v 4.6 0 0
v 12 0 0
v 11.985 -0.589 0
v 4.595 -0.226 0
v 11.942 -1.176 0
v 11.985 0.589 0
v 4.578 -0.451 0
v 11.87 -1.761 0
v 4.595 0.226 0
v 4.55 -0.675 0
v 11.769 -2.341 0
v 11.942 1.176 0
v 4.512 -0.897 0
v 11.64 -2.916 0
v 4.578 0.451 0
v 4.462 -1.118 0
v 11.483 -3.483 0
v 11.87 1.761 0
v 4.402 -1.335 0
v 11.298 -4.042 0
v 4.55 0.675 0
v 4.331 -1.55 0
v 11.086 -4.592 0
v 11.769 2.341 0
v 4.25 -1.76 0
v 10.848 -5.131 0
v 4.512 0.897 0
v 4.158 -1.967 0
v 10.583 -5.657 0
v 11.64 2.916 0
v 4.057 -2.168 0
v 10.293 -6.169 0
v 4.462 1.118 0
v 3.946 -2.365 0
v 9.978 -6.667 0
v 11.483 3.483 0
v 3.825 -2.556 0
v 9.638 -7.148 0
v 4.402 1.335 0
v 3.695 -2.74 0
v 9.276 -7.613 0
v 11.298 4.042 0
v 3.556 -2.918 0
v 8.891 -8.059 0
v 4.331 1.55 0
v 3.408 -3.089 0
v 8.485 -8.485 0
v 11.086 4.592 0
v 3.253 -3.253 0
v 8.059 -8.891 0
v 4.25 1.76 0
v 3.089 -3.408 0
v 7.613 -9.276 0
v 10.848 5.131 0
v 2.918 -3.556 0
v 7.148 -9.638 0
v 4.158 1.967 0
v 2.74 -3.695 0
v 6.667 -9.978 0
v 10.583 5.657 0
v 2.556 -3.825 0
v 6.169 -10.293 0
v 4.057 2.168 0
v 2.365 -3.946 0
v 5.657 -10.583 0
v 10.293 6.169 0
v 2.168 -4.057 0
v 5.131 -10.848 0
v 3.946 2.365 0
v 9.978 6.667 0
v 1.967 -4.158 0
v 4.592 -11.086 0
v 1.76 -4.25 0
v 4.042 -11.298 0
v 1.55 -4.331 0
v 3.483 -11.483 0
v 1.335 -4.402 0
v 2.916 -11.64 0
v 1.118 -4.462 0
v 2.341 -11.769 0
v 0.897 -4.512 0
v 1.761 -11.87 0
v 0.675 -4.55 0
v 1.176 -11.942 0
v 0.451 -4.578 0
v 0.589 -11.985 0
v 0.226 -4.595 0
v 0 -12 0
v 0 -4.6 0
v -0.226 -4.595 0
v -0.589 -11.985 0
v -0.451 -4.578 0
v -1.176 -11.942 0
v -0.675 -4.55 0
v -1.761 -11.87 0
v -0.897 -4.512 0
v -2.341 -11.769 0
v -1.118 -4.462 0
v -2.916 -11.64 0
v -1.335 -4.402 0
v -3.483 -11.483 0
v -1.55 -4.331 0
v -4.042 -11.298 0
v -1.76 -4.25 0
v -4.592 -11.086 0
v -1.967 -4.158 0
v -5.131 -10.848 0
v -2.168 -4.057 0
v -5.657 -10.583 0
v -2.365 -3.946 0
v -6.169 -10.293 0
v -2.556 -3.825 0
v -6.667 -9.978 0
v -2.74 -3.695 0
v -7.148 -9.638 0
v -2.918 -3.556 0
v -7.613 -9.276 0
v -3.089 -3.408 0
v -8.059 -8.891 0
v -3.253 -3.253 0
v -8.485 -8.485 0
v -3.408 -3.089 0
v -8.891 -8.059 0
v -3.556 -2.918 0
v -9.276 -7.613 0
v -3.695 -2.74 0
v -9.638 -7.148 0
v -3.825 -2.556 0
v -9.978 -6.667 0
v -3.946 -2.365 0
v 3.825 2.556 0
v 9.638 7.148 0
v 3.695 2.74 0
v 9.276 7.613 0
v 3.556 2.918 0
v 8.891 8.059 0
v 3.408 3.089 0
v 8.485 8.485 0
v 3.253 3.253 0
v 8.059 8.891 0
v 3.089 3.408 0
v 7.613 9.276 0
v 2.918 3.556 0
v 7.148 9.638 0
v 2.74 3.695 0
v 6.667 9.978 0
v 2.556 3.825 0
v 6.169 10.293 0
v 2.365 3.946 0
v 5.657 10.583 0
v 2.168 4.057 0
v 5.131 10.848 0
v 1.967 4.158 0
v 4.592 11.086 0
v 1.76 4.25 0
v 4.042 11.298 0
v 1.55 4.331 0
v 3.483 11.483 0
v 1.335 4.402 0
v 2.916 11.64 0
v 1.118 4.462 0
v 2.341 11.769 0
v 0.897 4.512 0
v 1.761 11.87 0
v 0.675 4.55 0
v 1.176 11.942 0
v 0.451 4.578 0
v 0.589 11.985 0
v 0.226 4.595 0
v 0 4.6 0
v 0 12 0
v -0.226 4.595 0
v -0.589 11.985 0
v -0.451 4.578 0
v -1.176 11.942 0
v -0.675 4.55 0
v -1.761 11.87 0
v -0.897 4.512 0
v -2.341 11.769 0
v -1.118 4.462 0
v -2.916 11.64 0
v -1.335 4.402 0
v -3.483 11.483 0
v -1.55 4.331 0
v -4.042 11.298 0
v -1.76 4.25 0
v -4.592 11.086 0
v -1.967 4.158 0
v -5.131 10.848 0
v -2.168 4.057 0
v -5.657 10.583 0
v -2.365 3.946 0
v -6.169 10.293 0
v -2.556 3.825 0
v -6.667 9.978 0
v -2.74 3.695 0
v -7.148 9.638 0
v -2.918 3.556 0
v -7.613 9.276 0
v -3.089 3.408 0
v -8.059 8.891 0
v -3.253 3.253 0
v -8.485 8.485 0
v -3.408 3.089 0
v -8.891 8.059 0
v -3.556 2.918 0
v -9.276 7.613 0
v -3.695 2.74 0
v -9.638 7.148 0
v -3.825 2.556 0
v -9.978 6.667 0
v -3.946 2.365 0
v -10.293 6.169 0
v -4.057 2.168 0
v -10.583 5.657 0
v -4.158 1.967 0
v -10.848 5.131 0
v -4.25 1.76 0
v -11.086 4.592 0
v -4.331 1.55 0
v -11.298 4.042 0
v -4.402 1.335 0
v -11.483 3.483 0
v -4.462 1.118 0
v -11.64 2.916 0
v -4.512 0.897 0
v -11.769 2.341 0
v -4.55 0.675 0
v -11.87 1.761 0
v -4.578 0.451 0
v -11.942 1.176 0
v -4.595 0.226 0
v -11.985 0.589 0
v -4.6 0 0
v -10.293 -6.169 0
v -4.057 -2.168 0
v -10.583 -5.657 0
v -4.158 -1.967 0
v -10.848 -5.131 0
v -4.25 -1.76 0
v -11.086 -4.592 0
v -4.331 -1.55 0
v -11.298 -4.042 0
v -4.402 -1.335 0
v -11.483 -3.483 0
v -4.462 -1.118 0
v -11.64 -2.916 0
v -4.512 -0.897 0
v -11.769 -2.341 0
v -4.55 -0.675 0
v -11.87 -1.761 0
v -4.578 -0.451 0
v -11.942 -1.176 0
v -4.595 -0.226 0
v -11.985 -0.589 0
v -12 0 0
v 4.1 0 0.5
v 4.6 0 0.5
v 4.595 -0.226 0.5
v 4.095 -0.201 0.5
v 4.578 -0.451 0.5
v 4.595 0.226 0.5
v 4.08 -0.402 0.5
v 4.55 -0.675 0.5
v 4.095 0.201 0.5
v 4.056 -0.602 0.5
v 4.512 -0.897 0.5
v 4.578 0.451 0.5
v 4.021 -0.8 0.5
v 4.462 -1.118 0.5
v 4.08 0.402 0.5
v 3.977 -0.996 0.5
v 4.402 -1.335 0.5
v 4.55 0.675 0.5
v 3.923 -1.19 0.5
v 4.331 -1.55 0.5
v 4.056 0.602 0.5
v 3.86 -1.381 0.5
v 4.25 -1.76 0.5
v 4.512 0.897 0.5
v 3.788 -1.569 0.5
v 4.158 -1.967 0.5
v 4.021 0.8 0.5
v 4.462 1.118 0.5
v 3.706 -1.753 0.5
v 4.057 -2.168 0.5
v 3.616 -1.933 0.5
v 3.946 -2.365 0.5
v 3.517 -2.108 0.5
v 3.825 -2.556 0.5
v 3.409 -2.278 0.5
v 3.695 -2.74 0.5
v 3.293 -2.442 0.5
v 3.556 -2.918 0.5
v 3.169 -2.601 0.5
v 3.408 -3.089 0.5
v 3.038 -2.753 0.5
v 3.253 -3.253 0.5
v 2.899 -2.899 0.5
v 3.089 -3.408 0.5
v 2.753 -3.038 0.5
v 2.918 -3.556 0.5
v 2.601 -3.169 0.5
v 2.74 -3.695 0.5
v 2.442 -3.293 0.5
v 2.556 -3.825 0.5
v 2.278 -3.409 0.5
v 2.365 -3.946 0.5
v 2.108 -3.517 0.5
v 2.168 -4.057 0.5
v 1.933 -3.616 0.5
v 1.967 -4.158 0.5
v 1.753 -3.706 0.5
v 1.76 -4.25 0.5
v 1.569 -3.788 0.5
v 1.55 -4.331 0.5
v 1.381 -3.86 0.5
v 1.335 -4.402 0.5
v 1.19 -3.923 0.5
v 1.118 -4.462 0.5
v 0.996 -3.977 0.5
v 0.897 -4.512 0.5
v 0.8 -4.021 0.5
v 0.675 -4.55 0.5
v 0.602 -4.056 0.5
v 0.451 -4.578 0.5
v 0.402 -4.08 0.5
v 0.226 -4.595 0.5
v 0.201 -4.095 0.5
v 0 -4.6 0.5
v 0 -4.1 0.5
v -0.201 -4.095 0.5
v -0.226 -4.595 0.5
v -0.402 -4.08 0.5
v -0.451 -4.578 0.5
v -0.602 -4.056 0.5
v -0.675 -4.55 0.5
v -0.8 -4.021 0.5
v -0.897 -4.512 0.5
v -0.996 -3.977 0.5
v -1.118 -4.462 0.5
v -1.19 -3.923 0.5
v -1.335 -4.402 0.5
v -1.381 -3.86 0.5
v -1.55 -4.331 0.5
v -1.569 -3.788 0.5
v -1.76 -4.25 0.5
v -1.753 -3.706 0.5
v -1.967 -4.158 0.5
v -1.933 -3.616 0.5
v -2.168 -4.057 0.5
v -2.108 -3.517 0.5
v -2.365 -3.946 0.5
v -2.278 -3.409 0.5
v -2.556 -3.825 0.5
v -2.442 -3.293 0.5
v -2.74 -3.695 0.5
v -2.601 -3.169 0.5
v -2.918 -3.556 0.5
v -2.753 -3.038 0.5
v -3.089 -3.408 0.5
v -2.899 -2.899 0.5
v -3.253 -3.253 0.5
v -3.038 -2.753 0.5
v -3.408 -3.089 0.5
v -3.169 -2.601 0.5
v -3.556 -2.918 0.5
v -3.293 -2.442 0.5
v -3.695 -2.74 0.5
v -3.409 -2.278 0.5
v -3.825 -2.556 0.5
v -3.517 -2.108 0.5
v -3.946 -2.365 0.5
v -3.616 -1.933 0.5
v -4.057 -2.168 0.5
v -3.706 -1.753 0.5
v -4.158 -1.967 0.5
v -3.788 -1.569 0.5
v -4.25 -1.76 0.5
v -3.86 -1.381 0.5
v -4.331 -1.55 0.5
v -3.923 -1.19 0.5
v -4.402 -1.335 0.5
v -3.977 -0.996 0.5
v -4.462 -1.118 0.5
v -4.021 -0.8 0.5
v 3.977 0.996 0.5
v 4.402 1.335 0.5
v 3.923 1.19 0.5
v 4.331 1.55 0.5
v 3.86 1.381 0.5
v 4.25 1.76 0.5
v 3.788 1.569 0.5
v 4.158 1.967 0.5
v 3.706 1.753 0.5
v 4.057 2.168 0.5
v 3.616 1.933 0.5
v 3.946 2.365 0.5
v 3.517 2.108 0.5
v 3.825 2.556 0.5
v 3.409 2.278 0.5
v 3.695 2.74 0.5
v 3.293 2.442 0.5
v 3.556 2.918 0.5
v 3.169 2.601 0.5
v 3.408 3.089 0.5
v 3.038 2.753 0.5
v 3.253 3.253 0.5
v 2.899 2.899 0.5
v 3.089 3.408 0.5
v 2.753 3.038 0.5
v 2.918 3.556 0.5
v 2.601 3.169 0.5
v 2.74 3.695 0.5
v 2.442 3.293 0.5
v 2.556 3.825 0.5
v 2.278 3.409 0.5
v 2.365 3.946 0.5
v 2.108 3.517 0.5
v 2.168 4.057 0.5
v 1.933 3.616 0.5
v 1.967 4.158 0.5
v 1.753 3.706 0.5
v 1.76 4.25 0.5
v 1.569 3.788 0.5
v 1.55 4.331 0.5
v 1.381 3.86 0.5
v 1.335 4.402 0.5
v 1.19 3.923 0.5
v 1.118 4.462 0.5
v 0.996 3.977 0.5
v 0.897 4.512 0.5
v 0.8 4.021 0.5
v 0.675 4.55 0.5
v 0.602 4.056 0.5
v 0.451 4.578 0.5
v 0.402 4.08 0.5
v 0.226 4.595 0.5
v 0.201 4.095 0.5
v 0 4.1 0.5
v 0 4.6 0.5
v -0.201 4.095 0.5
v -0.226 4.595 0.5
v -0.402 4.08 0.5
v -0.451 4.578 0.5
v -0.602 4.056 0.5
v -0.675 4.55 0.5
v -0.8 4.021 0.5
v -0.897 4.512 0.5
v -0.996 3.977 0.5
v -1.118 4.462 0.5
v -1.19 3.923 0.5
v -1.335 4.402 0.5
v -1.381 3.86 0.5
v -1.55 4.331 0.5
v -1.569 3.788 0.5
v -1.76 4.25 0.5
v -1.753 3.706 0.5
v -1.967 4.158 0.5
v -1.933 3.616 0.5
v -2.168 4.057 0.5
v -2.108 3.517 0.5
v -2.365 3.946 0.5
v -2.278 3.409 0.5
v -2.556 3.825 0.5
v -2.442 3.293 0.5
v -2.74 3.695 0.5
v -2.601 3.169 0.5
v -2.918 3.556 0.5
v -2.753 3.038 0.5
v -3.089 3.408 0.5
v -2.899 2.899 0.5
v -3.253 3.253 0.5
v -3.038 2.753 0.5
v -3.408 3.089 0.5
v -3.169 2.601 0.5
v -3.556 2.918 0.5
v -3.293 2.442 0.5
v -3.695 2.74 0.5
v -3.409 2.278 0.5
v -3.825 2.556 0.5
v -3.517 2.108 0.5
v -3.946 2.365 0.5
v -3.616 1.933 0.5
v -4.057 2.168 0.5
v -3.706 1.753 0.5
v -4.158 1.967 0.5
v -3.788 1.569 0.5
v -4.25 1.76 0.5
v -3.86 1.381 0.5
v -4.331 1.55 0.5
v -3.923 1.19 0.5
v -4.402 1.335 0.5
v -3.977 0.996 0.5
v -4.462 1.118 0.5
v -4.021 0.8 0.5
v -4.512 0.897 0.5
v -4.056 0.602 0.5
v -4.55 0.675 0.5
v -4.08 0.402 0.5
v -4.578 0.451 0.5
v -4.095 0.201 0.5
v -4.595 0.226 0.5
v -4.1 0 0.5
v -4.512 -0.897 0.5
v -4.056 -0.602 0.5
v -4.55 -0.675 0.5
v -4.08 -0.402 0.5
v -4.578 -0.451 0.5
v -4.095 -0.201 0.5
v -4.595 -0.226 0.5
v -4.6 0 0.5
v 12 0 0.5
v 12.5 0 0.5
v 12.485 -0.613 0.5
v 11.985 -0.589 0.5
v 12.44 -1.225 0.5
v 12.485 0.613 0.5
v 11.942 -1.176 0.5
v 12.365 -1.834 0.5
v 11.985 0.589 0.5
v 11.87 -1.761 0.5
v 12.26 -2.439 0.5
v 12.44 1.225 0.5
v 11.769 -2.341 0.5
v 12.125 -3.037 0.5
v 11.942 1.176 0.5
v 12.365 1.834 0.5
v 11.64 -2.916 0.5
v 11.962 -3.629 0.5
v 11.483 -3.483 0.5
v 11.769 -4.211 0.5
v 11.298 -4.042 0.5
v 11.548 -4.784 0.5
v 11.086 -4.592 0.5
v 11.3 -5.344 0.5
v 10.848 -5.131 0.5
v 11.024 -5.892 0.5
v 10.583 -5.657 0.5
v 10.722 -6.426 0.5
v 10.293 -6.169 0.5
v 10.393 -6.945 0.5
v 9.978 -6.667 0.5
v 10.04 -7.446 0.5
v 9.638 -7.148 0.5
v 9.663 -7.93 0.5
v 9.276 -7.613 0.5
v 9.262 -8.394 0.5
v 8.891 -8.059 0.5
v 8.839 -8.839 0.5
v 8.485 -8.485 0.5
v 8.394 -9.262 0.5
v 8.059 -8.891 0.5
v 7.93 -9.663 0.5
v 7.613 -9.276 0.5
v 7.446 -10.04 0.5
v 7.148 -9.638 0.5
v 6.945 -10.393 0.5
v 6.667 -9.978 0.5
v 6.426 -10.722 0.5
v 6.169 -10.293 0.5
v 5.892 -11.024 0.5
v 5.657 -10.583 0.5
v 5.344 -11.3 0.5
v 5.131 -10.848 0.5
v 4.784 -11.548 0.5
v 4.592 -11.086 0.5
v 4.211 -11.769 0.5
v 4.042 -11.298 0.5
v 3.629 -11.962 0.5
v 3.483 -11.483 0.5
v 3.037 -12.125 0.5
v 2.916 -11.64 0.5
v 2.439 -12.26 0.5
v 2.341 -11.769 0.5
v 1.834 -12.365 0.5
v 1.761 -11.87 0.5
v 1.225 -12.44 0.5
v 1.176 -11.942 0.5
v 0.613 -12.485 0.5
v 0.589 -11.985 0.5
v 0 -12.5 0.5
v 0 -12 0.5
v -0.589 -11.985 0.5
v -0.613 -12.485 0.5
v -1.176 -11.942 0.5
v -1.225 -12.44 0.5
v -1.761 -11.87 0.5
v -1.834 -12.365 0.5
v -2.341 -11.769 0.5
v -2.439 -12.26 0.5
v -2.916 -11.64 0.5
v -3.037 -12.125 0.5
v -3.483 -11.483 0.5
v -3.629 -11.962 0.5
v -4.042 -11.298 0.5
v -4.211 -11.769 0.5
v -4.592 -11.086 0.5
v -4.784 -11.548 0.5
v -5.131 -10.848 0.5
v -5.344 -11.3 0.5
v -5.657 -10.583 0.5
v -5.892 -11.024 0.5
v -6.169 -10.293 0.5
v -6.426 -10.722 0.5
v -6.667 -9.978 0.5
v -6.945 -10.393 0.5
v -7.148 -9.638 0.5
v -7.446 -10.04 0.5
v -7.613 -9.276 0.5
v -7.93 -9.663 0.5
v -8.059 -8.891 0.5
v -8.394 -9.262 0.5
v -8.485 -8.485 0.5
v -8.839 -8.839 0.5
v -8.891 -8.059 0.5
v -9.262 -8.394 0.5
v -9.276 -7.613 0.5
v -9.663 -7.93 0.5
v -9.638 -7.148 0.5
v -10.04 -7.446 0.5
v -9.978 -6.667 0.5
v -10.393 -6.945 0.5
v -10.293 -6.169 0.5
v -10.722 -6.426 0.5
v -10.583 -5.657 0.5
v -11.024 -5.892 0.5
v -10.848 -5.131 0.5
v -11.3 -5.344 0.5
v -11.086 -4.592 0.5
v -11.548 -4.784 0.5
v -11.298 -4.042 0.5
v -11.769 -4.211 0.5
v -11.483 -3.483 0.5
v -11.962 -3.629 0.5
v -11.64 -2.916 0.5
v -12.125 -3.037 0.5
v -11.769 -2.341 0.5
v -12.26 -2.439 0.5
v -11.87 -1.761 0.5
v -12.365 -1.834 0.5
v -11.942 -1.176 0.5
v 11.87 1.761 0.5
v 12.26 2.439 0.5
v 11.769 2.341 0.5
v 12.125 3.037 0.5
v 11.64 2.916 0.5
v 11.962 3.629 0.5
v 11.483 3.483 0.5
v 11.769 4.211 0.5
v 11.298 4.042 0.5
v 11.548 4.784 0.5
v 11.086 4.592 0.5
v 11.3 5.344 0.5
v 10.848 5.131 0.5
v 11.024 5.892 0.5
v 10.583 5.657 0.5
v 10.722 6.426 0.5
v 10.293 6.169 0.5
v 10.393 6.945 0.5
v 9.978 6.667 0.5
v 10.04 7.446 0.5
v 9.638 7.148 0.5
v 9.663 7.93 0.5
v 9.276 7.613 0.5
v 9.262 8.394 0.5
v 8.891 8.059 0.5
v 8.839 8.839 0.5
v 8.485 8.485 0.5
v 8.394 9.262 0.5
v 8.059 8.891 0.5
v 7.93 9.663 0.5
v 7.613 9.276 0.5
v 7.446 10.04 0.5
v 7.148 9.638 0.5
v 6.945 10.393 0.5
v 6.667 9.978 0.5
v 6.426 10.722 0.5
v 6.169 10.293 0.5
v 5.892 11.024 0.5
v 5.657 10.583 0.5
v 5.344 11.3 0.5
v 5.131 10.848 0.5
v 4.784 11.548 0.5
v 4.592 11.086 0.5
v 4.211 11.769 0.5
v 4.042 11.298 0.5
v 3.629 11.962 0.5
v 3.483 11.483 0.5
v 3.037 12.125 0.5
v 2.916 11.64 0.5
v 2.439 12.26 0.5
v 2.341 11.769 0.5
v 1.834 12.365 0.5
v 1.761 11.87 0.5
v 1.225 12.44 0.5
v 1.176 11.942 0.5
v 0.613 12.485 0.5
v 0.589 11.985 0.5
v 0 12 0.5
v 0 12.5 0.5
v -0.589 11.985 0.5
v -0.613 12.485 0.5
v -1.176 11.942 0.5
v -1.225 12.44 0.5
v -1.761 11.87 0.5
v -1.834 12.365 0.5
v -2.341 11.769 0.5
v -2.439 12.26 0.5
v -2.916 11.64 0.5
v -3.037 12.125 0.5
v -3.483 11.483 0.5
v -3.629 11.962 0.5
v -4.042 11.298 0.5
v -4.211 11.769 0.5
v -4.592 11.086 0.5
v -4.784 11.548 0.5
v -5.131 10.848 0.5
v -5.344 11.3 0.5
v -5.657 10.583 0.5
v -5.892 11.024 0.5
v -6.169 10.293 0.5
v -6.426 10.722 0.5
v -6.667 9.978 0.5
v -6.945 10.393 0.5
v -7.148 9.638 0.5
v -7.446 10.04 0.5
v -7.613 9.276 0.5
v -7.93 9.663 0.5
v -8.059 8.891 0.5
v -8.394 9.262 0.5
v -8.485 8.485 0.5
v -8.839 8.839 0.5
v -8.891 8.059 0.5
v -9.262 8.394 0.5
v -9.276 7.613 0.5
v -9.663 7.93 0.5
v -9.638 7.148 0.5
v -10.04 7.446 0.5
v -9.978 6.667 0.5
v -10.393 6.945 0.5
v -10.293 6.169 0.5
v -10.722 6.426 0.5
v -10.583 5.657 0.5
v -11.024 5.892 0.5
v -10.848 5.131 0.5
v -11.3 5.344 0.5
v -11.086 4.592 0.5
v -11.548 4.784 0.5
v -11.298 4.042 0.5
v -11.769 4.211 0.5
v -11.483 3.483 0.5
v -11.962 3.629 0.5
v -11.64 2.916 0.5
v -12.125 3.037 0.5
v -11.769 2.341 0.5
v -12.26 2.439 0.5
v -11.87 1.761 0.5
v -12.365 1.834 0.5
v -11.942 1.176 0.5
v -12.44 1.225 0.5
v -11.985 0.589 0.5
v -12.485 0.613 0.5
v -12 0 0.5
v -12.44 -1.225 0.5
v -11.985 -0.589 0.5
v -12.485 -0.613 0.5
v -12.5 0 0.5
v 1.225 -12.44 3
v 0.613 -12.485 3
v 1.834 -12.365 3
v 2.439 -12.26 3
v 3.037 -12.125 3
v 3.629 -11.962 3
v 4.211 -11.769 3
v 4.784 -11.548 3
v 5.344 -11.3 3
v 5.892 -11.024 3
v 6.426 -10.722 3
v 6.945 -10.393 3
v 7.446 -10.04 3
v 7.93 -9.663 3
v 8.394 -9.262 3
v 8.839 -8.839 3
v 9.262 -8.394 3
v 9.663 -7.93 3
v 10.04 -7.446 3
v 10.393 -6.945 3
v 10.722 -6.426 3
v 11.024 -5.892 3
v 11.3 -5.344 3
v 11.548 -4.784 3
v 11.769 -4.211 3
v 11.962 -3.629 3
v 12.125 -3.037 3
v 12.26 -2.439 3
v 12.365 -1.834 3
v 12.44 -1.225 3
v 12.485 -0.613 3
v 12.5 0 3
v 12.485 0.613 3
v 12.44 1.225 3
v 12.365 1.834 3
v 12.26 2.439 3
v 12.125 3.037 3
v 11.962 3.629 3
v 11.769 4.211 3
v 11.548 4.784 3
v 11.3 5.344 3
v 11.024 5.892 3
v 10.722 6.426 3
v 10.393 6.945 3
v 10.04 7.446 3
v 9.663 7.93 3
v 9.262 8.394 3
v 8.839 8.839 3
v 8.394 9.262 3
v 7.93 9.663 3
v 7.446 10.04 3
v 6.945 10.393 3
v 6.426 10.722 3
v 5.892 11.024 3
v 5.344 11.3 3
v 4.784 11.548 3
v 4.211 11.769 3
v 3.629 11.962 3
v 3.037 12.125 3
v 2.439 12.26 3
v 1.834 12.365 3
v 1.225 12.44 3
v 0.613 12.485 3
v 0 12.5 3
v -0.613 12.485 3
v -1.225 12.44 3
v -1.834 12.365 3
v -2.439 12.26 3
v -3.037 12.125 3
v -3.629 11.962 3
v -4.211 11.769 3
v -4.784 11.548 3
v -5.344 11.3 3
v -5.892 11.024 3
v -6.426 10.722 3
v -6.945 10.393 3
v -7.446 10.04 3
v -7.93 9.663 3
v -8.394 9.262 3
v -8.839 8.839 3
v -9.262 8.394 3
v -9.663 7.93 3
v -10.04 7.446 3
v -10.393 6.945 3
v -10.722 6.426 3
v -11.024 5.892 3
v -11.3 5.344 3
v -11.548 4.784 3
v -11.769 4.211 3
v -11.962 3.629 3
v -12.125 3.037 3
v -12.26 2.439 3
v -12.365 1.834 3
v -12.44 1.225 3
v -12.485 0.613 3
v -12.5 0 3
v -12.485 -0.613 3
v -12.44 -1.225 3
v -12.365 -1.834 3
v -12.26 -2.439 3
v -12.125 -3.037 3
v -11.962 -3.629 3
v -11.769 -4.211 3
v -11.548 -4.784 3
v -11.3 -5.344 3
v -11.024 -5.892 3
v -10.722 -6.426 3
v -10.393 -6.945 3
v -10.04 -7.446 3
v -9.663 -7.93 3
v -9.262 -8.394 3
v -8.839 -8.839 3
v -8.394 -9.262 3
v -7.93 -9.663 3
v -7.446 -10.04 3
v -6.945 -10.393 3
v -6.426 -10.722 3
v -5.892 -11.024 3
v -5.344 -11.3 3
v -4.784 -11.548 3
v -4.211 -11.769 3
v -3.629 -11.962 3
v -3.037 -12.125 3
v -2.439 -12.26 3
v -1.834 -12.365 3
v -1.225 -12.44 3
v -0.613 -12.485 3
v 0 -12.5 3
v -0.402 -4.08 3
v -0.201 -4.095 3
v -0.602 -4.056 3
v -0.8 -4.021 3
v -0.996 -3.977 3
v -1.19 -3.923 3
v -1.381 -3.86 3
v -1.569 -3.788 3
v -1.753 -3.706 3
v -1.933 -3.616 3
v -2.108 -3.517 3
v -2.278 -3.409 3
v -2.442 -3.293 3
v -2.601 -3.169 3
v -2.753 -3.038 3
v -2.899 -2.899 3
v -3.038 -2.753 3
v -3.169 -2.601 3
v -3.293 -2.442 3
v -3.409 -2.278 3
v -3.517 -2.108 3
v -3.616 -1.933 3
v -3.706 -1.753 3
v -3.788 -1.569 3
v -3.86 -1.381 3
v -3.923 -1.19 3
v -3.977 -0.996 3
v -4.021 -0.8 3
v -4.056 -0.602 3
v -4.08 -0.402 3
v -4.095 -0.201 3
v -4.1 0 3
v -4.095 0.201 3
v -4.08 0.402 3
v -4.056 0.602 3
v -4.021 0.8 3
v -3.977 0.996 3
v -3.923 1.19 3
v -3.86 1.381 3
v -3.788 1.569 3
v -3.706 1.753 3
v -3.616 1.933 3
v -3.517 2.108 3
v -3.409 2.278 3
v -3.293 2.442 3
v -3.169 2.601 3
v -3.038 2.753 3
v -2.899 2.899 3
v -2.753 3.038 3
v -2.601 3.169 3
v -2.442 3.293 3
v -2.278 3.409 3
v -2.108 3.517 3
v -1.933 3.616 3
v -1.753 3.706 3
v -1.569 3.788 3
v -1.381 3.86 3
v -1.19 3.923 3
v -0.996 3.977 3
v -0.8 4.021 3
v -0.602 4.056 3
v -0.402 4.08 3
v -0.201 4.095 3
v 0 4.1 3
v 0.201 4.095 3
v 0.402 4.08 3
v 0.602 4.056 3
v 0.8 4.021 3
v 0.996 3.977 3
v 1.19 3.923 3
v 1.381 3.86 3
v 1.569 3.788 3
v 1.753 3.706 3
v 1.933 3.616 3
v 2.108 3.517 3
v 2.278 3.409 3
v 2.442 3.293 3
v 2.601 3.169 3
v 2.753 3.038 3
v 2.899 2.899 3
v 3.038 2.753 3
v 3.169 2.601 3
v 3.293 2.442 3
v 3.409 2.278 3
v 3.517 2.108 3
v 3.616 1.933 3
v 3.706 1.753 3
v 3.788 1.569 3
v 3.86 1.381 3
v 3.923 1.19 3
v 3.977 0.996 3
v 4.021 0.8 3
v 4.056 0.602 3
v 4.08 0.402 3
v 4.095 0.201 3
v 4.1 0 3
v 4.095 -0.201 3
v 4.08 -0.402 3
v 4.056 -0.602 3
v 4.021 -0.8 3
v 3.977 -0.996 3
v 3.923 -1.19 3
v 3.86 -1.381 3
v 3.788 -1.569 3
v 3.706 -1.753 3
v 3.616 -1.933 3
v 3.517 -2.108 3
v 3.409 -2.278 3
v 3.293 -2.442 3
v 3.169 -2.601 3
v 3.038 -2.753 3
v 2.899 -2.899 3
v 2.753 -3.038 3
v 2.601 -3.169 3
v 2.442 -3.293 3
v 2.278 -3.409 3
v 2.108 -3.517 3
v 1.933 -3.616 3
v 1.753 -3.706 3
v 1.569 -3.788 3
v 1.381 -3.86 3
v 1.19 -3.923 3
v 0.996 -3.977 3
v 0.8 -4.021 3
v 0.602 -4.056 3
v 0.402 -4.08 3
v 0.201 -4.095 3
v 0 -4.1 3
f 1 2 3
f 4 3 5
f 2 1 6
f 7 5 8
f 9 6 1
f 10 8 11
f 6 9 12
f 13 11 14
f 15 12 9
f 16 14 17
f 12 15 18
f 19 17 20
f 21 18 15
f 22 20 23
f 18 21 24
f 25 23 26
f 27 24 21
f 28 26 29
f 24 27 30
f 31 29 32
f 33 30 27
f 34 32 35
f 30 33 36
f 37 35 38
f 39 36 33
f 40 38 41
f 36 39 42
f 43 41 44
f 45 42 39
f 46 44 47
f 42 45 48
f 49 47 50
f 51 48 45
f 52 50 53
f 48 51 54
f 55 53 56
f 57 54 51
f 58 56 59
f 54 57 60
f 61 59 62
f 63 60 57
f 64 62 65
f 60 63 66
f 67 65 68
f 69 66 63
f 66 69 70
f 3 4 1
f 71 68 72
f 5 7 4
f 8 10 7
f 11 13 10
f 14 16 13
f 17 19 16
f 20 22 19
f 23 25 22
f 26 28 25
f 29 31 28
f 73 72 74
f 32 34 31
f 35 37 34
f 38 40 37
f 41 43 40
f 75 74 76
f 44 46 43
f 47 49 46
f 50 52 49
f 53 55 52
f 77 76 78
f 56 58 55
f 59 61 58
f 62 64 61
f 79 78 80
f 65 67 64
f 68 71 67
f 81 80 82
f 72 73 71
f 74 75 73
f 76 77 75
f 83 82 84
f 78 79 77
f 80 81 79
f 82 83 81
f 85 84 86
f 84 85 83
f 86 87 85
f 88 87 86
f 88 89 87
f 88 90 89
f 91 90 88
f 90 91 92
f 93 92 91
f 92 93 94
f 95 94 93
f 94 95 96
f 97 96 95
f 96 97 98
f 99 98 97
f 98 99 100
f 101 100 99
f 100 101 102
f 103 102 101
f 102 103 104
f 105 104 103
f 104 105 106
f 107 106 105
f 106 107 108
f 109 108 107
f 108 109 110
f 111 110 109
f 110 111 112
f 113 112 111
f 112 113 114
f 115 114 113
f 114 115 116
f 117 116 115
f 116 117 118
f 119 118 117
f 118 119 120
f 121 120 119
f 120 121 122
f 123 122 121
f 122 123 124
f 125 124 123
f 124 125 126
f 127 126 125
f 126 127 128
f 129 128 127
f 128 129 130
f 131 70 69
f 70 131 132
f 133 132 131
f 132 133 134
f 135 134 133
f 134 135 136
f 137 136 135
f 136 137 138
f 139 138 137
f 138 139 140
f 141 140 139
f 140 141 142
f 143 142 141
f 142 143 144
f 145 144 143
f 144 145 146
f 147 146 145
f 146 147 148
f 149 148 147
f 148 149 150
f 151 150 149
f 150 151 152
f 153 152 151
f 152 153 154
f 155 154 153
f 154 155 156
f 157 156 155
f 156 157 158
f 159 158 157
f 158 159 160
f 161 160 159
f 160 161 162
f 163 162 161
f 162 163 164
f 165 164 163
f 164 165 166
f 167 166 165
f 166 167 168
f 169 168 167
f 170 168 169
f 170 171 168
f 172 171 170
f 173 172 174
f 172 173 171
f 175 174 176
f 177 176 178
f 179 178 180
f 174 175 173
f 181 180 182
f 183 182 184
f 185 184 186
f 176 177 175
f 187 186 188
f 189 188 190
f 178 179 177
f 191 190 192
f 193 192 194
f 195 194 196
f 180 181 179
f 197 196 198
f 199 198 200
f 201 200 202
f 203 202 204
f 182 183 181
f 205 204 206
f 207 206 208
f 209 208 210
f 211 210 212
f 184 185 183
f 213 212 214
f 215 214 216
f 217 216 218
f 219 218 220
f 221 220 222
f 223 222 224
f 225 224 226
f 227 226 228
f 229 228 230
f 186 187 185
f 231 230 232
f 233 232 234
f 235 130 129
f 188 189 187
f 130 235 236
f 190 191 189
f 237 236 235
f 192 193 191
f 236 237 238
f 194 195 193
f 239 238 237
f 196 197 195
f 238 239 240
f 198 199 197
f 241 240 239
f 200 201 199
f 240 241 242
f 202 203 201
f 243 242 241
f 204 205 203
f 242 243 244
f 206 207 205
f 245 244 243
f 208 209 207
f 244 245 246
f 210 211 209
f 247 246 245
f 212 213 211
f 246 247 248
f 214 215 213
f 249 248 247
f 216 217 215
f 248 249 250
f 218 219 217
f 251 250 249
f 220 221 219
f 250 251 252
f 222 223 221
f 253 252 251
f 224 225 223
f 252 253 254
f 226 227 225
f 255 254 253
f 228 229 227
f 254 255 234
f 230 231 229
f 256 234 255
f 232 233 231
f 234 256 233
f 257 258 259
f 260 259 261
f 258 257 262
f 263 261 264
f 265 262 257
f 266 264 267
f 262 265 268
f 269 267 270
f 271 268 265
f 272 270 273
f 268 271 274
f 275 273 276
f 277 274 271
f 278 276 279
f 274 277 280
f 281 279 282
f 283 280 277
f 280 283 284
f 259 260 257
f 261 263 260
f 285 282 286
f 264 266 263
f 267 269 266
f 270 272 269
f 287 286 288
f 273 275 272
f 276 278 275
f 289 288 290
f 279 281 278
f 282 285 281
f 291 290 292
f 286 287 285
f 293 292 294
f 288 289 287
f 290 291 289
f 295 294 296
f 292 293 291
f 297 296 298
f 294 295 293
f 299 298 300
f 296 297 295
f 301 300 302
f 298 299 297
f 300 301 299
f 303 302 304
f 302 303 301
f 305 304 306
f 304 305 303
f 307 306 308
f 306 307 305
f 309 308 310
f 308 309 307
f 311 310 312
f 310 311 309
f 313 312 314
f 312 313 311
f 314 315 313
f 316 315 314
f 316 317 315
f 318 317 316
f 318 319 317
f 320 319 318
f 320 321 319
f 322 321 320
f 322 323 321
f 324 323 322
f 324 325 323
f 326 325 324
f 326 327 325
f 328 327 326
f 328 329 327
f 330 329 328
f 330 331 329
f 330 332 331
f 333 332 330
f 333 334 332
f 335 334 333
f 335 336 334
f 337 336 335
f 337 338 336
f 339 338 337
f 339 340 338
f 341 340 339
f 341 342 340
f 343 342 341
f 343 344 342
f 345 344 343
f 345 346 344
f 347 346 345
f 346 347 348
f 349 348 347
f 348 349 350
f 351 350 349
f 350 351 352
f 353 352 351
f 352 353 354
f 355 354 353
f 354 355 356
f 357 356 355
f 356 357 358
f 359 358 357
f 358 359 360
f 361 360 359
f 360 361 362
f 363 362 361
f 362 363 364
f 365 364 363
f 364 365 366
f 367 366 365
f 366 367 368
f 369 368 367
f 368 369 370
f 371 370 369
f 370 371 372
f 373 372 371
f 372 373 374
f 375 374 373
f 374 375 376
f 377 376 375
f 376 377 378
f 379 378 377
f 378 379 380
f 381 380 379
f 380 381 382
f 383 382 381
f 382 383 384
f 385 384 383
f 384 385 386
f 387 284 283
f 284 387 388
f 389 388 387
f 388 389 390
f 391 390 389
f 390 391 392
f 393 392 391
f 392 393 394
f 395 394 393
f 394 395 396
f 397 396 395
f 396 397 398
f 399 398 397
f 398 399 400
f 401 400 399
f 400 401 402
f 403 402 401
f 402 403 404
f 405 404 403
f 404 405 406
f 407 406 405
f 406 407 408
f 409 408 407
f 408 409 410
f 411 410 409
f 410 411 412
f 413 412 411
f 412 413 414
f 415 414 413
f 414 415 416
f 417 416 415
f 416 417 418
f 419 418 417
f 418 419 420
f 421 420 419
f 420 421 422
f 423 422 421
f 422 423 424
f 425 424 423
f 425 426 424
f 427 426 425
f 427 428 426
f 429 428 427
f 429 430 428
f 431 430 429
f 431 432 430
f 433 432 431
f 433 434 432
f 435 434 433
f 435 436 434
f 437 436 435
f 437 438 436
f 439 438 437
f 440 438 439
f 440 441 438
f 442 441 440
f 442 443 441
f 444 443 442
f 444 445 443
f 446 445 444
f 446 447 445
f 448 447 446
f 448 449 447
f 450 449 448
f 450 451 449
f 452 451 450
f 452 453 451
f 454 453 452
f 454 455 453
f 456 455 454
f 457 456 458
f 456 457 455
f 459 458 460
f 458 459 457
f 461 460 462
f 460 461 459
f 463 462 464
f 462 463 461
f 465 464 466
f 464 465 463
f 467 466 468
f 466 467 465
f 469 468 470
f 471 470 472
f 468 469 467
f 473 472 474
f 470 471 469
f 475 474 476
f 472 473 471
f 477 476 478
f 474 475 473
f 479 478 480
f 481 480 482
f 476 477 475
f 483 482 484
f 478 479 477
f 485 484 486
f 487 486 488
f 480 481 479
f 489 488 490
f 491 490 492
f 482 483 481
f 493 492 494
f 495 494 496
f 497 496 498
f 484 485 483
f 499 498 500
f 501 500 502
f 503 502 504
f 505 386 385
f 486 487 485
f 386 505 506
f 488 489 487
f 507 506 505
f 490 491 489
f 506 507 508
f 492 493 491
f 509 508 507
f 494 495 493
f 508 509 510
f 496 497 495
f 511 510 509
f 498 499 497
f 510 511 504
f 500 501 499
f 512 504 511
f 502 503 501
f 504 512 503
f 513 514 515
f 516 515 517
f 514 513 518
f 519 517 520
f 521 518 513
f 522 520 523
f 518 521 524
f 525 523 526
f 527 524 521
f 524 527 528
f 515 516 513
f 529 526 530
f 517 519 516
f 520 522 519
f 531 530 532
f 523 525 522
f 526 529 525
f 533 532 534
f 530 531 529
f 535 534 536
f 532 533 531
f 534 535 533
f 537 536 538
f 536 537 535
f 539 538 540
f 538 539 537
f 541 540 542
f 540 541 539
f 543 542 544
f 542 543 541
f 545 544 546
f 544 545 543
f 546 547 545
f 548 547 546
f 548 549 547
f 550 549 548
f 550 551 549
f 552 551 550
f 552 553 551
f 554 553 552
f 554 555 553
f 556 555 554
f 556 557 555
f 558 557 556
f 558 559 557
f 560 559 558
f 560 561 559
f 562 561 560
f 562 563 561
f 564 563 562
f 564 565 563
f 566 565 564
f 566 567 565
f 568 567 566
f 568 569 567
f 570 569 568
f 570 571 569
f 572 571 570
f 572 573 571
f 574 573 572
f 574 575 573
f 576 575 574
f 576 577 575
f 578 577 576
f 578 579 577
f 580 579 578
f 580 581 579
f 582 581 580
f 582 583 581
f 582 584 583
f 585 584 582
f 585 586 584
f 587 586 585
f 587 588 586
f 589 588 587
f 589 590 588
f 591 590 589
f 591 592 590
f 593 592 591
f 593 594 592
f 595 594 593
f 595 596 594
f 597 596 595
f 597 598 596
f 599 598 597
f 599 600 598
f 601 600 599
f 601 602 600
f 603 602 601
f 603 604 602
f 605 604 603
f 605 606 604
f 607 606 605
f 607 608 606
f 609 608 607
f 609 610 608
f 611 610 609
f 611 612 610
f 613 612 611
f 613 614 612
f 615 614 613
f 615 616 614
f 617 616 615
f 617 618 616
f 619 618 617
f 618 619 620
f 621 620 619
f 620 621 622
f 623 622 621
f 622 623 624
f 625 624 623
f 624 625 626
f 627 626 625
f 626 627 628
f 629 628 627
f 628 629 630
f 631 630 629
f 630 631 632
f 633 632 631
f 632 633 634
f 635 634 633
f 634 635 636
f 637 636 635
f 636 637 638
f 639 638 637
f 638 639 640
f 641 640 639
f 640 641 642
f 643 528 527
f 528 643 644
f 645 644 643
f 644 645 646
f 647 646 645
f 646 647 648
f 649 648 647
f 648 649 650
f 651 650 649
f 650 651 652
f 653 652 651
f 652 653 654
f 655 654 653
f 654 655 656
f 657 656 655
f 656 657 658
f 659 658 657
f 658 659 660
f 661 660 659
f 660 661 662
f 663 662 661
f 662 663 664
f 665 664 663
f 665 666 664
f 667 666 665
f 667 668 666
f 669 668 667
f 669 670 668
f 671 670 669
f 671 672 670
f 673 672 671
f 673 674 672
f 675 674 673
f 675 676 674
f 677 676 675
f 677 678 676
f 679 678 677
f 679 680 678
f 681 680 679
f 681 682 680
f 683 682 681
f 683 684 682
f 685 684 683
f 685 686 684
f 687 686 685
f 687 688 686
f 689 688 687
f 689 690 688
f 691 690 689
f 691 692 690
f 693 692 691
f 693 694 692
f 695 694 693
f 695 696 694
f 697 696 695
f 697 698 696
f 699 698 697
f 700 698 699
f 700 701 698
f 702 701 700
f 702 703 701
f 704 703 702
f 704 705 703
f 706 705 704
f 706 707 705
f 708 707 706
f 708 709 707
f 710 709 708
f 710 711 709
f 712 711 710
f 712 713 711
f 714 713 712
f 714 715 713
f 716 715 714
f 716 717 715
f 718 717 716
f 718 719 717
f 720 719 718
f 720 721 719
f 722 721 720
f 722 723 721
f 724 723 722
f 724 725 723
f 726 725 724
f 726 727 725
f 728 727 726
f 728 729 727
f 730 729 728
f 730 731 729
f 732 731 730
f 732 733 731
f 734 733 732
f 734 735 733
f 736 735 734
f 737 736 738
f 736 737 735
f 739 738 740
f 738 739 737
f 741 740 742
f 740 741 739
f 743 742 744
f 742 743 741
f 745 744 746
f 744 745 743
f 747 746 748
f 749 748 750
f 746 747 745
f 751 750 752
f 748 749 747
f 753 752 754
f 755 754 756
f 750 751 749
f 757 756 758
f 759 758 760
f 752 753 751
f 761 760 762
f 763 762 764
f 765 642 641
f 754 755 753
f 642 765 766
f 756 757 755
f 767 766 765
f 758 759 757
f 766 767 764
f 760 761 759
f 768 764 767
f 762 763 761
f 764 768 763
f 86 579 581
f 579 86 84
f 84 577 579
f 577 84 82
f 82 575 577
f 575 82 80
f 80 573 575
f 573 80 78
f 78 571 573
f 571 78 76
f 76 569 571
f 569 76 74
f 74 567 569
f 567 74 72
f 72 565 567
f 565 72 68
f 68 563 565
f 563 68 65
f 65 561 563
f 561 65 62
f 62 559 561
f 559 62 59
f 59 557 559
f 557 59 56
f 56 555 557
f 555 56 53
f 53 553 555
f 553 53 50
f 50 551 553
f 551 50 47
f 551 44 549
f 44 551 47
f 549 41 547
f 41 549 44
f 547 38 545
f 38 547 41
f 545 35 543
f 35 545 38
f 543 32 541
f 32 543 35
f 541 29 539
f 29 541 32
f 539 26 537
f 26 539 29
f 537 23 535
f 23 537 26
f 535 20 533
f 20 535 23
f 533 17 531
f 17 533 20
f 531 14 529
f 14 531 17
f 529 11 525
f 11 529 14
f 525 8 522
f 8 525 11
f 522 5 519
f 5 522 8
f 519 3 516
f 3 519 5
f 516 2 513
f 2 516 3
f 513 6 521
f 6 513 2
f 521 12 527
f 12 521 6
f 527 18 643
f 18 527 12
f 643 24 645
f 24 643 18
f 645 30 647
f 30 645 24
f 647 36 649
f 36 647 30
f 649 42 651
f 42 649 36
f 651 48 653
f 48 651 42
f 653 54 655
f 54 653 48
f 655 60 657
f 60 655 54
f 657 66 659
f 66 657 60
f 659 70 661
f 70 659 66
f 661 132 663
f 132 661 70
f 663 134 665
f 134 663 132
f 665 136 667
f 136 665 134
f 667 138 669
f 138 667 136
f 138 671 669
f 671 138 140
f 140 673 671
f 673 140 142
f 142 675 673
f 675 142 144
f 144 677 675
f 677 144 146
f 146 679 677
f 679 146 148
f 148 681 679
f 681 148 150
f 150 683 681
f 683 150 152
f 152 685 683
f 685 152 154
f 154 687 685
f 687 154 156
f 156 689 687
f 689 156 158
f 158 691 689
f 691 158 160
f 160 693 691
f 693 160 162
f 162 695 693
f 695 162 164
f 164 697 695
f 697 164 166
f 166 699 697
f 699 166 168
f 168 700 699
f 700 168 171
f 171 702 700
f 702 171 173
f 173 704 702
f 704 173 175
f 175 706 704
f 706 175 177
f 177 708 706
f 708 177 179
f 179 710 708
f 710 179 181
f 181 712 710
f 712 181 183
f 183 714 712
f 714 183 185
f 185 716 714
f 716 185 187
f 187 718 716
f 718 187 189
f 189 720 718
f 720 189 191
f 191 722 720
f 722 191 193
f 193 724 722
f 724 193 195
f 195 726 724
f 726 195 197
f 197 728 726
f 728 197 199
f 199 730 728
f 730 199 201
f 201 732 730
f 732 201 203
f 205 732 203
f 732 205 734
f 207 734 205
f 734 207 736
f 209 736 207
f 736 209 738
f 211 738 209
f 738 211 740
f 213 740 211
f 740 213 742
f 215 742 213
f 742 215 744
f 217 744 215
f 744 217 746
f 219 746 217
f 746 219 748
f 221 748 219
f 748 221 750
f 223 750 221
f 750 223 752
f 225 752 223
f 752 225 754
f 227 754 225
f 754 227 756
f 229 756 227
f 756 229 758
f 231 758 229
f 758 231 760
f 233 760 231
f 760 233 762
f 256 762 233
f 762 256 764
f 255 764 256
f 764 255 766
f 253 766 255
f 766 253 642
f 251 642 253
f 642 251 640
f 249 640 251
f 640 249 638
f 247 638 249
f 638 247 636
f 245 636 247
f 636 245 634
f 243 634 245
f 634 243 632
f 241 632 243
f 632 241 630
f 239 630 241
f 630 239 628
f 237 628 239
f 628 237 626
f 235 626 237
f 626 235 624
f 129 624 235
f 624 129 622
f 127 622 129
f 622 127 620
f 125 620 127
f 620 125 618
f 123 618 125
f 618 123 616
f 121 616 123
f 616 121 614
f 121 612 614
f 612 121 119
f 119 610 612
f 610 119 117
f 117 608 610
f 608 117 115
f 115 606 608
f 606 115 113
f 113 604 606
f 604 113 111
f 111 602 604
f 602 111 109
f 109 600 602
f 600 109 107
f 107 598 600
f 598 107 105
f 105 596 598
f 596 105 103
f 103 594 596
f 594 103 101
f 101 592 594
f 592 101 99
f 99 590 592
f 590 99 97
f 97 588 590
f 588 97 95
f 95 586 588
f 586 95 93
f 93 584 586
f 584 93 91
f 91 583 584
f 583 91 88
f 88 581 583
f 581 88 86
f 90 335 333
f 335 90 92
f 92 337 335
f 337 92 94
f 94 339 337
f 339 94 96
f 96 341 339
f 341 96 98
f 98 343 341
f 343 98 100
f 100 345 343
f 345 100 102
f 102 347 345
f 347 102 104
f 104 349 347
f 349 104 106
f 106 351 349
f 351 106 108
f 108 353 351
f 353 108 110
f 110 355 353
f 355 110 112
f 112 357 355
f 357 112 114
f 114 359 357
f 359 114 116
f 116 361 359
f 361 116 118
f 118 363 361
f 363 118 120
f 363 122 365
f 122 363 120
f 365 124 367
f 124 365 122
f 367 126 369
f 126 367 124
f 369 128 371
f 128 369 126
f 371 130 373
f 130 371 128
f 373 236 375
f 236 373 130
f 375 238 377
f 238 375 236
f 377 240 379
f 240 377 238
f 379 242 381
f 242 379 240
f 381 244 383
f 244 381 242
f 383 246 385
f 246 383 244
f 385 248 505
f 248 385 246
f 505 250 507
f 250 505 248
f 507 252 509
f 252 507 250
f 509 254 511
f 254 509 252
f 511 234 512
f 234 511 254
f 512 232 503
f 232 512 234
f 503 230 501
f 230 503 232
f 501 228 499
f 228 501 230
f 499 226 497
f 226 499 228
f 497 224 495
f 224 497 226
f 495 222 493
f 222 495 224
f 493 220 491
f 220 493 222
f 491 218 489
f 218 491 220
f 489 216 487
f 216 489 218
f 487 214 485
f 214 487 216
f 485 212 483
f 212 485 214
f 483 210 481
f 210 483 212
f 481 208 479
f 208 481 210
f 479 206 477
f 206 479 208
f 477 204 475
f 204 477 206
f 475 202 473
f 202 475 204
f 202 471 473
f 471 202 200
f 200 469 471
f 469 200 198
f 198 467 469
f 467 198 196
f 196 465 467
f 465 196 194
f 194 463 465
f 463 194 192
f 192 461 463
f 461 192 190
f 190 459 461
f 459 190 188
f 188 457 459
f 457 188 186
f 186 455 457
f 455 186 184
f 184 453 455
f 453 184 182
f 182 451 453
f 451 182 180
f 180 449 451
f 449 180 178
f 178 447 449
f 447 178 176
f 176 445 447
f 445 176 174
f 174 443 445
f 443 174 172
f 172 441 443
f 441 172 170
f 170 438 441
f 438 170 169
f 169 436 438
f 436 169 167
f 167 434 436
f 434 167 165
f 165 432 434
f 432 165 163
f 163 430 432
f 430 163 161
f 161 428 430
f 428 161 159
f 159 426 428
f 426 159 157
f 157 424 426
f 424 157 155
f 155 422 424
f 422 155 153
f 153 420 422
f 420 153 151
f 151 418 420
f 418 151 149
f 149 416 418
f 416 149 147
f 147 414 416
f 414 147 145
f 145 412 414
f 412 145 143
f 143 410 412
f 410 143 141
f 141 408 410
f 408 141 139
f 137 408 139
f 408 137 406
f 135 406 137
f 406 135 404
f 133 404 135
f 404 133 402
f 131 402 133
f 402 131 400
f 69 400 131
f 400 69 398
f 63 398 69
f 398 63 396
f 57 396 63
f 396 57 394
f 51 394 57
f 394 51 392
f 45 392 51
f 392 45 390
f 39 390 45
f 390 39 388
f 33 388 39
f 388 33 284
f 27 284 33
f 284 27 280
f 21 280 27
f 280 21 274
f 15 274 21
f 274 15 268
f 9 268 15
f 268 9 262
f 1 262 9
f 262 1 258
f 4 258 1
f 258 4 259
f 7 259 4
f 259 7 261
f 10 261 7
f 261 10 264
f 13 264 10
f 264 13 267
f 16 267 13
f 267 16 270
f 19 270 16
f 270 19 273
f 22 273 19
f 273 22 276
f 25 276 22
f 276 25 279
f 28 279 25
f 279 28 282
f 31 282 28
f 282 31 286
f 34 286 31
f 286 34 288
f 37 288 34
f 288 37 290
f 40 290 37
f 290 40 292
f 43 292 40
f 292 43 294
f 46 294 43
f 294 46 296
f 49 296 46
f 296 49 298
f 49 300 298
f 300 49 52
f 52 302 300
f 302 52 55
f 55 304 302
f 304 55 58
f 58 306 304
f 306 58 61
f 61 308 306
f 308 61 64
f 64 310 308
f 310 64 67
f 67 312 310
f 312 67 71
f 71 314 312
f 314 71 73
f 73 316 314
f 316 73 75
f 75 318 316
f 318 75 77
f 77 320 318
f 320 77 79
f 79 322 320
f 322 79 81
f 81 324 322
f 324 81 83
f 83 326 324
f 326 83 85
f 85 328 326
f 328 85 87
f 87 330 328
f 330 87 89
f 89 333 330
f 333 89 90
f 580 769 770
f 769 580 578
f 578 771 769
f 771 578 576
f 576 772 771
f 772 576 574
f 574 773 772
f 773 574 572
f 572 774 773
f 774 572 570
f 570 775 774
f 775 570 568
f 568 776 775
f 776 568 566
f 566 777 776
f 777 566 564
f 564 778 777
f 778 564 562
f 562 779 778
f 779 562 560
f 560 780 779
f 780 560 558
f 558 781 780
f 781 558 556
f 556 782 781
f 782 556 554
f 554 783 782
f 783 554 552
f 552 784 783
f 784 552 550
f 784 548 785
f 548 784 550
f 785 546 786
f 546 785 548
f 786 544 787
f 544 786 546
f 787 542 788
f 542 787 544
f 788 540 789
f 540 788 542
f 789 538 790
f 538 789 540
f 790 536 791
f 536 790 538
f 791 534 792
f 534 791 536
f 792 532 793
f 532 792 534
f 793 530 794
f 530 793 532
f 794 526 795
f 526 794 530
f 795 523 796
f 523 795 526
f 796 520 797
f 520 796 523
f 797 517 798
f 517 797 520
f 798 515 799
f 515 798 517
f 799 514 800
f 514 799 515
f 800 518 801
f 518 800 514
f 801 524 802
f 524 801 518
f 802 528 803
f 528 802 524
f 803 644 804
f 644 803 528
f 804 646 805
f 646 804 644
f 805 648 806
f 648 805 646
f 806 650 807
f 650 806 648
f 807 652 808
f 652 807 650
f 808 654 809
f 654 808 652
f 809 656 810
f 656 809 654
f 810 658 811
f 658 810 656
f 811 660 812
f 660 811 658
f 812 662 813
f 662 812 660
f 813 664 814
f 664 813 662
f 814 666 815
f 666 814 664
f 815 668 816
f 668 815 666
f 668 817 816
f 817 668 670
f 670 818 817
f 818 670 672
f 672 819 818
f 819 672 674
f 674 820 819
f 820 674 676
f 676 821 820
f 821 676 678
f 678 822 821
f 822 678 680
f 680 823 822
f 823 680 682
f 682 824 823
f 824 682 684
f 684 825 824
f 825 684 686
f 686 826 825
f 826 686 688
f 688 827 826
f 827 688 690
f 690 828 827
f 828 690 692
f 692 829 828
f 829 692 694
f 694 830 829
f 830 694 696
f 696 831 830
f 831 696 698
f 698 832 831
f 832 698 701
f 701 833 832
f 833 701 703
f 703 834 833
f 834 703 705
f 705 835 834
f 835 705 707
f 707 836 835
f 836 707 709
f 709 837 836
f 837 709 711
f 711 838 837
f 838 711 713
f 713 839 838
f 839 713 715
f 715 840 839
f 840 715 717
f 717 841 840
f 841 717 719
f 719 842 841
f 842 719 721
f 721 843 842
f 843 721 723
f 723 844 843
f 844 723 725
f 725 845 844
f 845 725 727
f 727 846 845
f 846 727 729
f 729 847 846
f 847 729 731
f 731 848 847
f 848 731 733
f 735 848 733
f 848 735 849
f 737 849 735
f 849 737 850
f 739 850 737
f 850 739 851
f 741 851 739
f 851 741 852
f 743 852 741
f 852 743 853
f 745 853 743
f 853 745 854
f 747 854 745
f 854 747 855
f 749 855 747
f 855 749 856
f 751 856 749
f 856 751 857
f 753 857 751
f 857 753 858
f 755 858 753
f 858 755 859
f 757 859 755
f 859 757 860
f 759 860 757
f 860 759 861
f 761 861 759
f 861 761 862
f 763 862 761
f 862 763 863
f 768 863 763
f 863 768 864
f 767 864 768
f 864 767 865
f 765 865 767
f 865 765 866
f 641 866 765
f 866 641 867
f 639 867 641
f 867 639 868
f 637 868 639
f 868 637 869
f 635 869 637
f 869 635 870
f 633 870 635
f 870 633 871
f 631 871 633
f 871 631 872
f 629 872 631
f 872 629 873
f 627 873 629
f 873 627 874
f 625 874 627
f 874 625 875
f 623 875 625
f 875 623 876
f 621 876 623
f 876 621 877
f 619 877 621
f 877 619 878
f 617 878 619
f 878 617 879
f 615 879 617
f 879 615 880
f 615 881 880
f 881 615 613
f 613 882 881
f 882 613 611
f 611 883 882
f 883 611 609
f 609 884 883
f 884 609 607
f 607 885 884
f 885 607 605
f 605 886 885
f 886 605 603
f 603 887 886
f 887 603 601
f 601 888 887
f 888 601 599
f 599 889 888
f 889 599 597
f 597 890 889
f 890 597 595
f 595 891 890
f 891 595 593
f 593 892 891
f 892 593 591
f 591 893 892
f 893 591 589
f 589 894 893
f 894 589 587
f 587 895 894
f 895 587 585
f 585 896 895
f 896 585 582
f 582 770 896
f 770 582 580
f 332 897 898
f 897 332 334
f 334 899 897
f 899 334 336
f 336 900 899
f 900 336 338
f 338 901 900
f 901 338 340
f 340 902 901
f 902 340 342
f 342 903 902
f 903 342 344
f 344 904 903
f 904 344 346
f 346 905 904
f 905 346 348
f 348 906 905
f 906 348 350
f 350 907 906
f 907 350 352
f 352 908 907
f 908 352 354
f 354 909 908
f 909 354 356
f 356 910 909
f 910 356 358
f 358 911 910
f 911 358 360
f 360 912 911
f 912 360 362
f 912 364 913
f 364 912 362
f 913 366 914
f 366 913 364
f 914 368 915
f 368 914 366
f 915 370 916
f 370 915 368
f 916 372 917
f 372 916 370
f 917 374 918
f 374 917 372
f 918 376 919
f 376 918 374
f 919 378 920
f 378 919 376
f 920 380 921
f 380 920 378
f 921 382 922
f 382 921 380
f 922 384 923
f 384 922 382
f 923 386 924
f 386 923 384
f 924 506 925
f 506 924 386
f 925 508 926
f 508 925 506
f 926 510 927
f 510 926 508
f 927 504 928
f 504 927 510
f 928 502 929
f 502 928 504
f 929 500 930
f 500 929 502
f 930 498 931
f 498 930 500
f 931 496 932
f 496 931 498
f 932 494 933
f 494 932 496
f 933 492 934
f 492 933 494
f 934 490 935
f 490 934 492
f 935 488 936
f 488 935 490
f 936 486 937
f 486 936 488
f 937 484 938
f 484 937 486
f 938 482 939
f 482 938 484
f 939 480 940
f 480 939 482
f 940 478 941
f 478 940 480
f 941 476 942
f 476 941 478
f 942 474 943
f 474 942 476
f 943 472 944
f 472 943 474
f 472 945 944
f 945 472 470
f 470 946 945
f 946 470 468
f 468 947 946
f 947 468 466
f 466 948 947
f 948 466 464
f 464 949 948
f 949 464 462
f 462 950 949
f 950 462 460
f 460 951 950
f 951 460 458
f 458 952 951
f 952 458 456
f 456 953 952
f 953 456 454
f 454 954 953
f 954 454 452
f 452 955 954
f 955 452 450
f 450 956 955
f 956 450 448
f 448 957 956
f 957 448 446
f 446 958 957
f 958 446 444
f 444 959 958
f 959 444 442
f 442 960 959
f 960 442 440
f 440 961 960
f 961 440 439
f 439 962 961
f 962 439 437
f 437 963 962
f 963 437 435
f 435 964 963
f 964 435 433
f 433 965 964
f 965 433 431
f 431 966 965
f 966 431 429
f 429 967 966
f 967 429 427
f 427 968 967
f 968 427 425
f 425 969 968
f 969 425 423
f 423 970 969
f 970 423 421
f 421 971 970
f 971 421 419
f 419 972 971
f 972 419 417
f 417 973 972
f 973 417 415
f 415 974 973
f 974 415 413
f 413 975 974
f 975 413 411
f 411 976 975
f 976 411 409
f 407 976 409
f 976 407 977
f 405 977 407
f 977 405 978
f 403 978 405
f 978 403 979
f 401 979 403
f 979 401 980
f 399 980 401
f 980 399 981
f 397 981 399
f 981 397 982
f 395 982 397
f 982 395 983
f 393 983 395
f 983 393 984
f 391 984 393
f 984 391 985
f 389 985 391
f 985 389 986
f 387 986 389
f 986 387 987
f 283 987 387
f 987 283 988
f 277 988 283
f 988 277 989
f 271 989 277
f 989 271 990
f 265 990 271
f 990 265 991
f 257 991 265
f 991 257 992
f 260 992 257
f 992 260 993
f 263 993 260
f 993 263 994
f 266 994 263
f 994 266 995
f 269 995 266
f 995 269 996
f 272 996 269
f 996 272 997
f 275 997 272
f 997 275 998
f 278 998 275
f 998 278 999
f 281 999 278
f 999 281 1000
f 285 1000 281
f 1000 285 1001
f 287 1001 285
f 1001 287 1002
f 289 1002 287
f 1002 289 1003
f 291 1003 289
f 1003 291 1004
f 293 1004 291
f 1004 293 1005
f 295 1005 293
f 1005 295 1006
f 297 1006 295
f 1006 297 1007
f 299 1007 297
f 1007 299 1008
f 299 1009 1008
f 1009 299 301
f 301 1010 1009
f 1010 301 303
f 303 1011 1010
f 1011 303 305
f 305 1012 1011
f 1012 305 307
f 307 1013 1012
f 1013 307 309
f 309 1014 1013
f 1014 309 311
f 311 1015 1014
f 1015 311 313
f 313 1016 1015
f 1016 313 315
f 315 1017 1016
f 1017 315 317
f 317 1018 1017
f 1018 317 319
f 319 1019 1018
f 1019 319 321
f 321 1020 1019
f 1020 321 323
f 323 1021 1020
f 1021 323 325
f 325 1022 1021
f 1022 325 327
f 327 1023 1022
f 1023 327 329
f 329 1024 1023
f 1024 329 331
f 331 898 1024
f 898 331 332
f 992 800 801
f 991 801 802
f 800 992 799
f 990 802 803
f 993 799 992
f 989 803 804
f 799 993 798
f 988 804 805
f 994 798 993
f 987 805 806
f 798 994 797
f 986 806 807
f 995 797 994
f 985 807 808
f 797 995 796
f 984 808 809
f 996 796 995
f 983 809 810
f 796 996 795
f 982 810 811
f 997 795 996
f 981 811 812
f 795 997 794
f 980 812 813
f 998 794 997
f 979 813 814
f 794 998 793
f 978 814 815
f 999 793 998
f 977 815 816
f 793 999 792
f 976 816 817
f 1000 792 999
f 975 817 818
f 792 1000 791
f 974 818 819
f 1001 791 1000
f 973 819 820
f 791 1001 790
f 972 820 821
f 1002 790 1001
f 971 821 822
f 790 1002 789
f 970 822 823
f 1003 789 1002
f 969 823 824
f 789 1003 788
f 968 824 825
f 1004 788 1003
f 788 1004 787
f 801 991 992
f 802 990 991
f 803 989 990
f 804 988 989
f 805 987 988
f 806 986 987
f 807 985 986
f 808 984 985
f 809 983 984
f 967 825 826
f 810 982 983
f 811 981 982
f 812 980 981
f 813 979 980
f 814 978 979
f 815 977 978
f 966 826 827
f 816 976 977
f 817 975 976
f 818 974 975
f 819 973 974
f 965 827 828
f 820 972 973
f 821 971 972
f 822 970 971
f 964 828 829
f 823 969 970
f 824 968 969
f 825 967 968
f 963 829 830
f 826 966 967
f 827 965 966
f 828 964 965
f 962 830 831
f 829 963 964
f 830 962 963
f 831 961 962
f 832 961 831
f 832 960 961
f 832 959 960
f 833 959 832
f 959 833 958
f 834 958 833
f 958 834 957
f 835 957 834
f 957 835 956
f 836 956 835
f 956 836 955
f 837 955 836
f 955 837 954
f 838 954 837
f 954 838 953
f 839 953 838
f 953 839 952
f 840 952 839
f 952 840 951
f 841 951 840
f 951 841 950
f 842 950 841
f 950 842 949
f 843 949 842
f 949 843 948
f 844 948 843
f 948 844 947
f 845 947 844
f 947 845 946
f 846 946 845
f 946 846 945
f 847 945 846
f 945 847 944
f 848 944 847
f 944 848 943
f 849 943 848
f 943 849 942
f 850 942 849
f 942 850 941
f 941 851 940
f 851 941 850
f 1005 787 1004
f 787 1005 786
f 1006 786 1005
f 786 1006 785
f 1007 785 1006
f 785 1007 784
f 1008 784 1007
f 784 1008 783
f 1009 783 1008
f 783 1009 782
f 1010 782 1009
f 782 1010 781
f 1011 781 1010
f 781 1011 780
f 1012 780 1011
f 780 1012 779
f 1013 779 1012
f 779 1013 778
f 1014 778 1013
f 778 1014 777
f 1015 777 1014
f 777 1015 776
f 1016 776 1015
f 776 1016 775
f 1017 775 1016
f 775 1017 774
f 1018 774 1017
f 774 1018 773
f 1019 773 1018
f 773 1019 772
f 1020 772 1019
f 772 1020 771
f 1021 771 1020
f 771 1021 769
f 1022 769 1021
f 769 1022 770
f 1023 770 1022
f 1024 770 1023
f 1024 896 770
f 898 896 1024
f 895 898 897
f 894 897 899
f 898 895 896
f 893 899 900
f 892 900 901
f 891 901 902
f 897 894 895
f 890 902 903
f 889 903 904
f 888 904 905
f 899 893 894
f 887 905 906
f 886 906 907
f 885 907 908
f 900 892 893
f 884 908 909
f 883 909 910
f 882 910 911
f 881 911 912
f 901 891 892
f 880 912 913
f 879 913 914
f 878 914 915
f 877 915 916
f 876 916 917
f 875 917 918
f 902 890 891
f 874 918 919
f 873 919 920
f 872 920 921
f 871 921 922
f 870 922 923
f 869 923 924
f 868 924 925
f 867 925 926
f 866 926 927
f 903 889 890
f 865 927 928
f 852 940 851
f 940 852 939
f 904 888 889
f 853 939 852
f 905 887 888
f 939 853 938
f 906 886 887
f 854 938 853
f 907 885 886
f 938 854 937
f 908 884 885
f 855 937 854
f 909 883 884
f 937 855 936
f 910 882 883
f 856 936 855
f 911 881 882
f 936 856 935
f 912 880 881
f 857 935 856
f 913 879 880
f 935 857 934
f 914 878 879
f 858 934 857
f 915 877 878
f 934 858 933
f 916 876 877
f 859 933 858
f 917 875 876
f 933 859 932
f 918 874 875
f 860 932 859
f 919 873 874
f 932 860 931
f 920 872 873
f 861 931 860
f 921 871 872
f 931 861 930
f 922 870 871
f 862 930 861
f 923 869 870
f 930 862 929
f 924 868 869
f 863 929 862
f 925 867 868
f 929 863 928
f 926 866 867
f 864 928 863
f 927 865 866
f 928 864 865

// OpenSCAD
/****************************************************
 Parametric Washer / Spacer (MakerWorld / OpenSCAD)
****************************************************/

/* [Basic] */

Shape = 0; // [0:Circle, 1:Triangle, 2:Square, 3:Polygon]

// Must be > Inner Diameter
Outer_Diameter = 25; // [1:0.1:200]
Height = 3; // [0.2:0.1:50]

// Sets Inner_Diameter automatically unless "Custom"
Screw_Preset = 0;    // [0:Custom, 1:M3, 2:M4, 3:M5, 4:M6, 5:M8]

// Only used when Screw Preset = Custom
Inner_Diameter = 8;  // [0:0.1:199]

// Only used when Shape = Polygon
Polygon_Sides = 6;   // [3:1:30]


/* [Advanced] */

// Adds extra clearance to the inner hole (mm)
Hole_Tolerance = 0.2; // [0:0.05:1]

// Chamfer (simple 45° style) on top and bottom edges
Chamfer = true;       // [true,false]
Chamfer_Size = 0.5;   // [0:0.1:5]

// Countersink on the top face
Countersink = false;          // [true,false]
Countersink_Top_Diameter = 12; // [0:0.1:200]
Countersink_Depth = 1.0;       // [0:0.1:20]


/* [Quality] */
$fn = 128; // [16:1:256]


// ---------- Derived parameters ----------

// Typical clearance holes (FDM-friendly defaults). Adjust as you like.
function preset_hole_d(p) =
    (p == 1) ? 3.2 :  // M3
    (p == 2) ? 4.3 :  // M4
    (p == 3) ? 5.3 :  // M5
    (p == 4) ? 6.4 :  // M6
    (p == 5) ? 8.4 :  // M8
              Inner_Diameter; // Custom

Inner_Hole_D = preset_hole_d(Screw_Preset) + Hole_Tolerance;


// ---------- Geometry helpers ----------
module regular_ngon(n, r) {
    polygon(points=[
        for (i = [0:n-1])
            [r*cos(360*i/n), r*sin(360*i/n)]
    ]);
}

module outer_profile(shape, od, n) {
    if (shape == 0) {
        circle(d = od);
    } else if (shape == 1) {
        regular_ngon(3, od/2);
    } else if (shape == 2) {
        square([od / sqrt(2), od / sqrt(2)], center = true); // diagonal = od
    } else {
        regular_ngon(max(3, n), od/2);
    }
}

// 2D chamfer via offset (shrinks the profile near top/bottom)
module chamfered_extrude_2d(profile_2d, h, c) {
    // If c == 0, just normal extrude
    if (c <= 0) {
        linear_extrude(height = h) children();
    } else {
        // Create a simple “bevel” by stacking 3 extrusions:
        // bottom bevel, straight middle, top bevel.
        // This is fast and robust in OpenSCAD.
        bottom_h = min(c, h/2);
        top_h    = min(c, h/2);
        mid_h    = max(0, h - bottom_h - top_h);

        // Bottom bevel: grow from slightly inset to full
        for (i = [0:1]) {
            // i=0 at very bottom (more inset), i=1 at top of bevel (less inset)
            t = i/1;
            z = t * bottom_h;
            translate([0,0,z])
                linear_extrude(height = (i==0)? bottom_h : 0)  // only extrude once at i=0
                    offset(delta = -(1 - t)*c) children();
        }

        // Middle straight section
        if (mid_h > 0)
            translate([0,0,bottom_h])
                linear_extrude(height = mid_h) children();

        // Top bevel: shrink towards top
        for (i = [0:1]) {
            t = i/1;
            z = bottom_h + mid_h + t * top_h;
            translate([0,0,z])
                linear_extrude(height = (i==0)? top_h : 0)
                    offset(delta = -t*c) children();
        }
    }
}

module washer(shape, od, hole_d, h, n, do_chamfer, chamfer_size, do_cs, cs_top_d, cs_depth) {
    assert(od > 0, "Outer_Diameter must be > 0");
    assert(h > 0, "Height must be > 0");
    assert(hole_d >= 0, "Inner hole must be >= 0");
    assert(od > hole_d, "Outer_Diameter must be > inner hole diameter");

    difference() {
        // Body (optionally chamfered)
        if (do_chamfer && chamfer_size > 0) {
            chamfered_extrude_2d(true, h, chamfer_size)
                difference() {
                    outer_profile(shape, od, n);
                    if (hole_d > 0) circle(d = hole_d);
                }
        } else {
            linear_extrude(height = h)
                difference() {
                    outer_profile(shape, od, n);
                    if (hole_d > 0) circle(d = hole_d);
                }
        }

        // Countersink (top face)
        if (do_cs && cs_top_d > hole_d && cs_depth > 0) {
            // subtract a conical frustum from the top
            translate([0,0,h - min(cs_depth, h)])
                cylinder(
                    h = min(cs_depth, h),
                    d1 = cs_top_d,
                    d2 = hole_d,
                    center = false
                );
        }
    }
}


// ---------- Build ----------
washer(
    Shape,
    Outer_Diameter,
    Inner_Hole_D,
    Height,
    Polygon_Sides,
    Chamfer,
    Chamfer_Size,
    Countersink,
    Countersink_Top_Diameter,
    Countersink_Depth
);
